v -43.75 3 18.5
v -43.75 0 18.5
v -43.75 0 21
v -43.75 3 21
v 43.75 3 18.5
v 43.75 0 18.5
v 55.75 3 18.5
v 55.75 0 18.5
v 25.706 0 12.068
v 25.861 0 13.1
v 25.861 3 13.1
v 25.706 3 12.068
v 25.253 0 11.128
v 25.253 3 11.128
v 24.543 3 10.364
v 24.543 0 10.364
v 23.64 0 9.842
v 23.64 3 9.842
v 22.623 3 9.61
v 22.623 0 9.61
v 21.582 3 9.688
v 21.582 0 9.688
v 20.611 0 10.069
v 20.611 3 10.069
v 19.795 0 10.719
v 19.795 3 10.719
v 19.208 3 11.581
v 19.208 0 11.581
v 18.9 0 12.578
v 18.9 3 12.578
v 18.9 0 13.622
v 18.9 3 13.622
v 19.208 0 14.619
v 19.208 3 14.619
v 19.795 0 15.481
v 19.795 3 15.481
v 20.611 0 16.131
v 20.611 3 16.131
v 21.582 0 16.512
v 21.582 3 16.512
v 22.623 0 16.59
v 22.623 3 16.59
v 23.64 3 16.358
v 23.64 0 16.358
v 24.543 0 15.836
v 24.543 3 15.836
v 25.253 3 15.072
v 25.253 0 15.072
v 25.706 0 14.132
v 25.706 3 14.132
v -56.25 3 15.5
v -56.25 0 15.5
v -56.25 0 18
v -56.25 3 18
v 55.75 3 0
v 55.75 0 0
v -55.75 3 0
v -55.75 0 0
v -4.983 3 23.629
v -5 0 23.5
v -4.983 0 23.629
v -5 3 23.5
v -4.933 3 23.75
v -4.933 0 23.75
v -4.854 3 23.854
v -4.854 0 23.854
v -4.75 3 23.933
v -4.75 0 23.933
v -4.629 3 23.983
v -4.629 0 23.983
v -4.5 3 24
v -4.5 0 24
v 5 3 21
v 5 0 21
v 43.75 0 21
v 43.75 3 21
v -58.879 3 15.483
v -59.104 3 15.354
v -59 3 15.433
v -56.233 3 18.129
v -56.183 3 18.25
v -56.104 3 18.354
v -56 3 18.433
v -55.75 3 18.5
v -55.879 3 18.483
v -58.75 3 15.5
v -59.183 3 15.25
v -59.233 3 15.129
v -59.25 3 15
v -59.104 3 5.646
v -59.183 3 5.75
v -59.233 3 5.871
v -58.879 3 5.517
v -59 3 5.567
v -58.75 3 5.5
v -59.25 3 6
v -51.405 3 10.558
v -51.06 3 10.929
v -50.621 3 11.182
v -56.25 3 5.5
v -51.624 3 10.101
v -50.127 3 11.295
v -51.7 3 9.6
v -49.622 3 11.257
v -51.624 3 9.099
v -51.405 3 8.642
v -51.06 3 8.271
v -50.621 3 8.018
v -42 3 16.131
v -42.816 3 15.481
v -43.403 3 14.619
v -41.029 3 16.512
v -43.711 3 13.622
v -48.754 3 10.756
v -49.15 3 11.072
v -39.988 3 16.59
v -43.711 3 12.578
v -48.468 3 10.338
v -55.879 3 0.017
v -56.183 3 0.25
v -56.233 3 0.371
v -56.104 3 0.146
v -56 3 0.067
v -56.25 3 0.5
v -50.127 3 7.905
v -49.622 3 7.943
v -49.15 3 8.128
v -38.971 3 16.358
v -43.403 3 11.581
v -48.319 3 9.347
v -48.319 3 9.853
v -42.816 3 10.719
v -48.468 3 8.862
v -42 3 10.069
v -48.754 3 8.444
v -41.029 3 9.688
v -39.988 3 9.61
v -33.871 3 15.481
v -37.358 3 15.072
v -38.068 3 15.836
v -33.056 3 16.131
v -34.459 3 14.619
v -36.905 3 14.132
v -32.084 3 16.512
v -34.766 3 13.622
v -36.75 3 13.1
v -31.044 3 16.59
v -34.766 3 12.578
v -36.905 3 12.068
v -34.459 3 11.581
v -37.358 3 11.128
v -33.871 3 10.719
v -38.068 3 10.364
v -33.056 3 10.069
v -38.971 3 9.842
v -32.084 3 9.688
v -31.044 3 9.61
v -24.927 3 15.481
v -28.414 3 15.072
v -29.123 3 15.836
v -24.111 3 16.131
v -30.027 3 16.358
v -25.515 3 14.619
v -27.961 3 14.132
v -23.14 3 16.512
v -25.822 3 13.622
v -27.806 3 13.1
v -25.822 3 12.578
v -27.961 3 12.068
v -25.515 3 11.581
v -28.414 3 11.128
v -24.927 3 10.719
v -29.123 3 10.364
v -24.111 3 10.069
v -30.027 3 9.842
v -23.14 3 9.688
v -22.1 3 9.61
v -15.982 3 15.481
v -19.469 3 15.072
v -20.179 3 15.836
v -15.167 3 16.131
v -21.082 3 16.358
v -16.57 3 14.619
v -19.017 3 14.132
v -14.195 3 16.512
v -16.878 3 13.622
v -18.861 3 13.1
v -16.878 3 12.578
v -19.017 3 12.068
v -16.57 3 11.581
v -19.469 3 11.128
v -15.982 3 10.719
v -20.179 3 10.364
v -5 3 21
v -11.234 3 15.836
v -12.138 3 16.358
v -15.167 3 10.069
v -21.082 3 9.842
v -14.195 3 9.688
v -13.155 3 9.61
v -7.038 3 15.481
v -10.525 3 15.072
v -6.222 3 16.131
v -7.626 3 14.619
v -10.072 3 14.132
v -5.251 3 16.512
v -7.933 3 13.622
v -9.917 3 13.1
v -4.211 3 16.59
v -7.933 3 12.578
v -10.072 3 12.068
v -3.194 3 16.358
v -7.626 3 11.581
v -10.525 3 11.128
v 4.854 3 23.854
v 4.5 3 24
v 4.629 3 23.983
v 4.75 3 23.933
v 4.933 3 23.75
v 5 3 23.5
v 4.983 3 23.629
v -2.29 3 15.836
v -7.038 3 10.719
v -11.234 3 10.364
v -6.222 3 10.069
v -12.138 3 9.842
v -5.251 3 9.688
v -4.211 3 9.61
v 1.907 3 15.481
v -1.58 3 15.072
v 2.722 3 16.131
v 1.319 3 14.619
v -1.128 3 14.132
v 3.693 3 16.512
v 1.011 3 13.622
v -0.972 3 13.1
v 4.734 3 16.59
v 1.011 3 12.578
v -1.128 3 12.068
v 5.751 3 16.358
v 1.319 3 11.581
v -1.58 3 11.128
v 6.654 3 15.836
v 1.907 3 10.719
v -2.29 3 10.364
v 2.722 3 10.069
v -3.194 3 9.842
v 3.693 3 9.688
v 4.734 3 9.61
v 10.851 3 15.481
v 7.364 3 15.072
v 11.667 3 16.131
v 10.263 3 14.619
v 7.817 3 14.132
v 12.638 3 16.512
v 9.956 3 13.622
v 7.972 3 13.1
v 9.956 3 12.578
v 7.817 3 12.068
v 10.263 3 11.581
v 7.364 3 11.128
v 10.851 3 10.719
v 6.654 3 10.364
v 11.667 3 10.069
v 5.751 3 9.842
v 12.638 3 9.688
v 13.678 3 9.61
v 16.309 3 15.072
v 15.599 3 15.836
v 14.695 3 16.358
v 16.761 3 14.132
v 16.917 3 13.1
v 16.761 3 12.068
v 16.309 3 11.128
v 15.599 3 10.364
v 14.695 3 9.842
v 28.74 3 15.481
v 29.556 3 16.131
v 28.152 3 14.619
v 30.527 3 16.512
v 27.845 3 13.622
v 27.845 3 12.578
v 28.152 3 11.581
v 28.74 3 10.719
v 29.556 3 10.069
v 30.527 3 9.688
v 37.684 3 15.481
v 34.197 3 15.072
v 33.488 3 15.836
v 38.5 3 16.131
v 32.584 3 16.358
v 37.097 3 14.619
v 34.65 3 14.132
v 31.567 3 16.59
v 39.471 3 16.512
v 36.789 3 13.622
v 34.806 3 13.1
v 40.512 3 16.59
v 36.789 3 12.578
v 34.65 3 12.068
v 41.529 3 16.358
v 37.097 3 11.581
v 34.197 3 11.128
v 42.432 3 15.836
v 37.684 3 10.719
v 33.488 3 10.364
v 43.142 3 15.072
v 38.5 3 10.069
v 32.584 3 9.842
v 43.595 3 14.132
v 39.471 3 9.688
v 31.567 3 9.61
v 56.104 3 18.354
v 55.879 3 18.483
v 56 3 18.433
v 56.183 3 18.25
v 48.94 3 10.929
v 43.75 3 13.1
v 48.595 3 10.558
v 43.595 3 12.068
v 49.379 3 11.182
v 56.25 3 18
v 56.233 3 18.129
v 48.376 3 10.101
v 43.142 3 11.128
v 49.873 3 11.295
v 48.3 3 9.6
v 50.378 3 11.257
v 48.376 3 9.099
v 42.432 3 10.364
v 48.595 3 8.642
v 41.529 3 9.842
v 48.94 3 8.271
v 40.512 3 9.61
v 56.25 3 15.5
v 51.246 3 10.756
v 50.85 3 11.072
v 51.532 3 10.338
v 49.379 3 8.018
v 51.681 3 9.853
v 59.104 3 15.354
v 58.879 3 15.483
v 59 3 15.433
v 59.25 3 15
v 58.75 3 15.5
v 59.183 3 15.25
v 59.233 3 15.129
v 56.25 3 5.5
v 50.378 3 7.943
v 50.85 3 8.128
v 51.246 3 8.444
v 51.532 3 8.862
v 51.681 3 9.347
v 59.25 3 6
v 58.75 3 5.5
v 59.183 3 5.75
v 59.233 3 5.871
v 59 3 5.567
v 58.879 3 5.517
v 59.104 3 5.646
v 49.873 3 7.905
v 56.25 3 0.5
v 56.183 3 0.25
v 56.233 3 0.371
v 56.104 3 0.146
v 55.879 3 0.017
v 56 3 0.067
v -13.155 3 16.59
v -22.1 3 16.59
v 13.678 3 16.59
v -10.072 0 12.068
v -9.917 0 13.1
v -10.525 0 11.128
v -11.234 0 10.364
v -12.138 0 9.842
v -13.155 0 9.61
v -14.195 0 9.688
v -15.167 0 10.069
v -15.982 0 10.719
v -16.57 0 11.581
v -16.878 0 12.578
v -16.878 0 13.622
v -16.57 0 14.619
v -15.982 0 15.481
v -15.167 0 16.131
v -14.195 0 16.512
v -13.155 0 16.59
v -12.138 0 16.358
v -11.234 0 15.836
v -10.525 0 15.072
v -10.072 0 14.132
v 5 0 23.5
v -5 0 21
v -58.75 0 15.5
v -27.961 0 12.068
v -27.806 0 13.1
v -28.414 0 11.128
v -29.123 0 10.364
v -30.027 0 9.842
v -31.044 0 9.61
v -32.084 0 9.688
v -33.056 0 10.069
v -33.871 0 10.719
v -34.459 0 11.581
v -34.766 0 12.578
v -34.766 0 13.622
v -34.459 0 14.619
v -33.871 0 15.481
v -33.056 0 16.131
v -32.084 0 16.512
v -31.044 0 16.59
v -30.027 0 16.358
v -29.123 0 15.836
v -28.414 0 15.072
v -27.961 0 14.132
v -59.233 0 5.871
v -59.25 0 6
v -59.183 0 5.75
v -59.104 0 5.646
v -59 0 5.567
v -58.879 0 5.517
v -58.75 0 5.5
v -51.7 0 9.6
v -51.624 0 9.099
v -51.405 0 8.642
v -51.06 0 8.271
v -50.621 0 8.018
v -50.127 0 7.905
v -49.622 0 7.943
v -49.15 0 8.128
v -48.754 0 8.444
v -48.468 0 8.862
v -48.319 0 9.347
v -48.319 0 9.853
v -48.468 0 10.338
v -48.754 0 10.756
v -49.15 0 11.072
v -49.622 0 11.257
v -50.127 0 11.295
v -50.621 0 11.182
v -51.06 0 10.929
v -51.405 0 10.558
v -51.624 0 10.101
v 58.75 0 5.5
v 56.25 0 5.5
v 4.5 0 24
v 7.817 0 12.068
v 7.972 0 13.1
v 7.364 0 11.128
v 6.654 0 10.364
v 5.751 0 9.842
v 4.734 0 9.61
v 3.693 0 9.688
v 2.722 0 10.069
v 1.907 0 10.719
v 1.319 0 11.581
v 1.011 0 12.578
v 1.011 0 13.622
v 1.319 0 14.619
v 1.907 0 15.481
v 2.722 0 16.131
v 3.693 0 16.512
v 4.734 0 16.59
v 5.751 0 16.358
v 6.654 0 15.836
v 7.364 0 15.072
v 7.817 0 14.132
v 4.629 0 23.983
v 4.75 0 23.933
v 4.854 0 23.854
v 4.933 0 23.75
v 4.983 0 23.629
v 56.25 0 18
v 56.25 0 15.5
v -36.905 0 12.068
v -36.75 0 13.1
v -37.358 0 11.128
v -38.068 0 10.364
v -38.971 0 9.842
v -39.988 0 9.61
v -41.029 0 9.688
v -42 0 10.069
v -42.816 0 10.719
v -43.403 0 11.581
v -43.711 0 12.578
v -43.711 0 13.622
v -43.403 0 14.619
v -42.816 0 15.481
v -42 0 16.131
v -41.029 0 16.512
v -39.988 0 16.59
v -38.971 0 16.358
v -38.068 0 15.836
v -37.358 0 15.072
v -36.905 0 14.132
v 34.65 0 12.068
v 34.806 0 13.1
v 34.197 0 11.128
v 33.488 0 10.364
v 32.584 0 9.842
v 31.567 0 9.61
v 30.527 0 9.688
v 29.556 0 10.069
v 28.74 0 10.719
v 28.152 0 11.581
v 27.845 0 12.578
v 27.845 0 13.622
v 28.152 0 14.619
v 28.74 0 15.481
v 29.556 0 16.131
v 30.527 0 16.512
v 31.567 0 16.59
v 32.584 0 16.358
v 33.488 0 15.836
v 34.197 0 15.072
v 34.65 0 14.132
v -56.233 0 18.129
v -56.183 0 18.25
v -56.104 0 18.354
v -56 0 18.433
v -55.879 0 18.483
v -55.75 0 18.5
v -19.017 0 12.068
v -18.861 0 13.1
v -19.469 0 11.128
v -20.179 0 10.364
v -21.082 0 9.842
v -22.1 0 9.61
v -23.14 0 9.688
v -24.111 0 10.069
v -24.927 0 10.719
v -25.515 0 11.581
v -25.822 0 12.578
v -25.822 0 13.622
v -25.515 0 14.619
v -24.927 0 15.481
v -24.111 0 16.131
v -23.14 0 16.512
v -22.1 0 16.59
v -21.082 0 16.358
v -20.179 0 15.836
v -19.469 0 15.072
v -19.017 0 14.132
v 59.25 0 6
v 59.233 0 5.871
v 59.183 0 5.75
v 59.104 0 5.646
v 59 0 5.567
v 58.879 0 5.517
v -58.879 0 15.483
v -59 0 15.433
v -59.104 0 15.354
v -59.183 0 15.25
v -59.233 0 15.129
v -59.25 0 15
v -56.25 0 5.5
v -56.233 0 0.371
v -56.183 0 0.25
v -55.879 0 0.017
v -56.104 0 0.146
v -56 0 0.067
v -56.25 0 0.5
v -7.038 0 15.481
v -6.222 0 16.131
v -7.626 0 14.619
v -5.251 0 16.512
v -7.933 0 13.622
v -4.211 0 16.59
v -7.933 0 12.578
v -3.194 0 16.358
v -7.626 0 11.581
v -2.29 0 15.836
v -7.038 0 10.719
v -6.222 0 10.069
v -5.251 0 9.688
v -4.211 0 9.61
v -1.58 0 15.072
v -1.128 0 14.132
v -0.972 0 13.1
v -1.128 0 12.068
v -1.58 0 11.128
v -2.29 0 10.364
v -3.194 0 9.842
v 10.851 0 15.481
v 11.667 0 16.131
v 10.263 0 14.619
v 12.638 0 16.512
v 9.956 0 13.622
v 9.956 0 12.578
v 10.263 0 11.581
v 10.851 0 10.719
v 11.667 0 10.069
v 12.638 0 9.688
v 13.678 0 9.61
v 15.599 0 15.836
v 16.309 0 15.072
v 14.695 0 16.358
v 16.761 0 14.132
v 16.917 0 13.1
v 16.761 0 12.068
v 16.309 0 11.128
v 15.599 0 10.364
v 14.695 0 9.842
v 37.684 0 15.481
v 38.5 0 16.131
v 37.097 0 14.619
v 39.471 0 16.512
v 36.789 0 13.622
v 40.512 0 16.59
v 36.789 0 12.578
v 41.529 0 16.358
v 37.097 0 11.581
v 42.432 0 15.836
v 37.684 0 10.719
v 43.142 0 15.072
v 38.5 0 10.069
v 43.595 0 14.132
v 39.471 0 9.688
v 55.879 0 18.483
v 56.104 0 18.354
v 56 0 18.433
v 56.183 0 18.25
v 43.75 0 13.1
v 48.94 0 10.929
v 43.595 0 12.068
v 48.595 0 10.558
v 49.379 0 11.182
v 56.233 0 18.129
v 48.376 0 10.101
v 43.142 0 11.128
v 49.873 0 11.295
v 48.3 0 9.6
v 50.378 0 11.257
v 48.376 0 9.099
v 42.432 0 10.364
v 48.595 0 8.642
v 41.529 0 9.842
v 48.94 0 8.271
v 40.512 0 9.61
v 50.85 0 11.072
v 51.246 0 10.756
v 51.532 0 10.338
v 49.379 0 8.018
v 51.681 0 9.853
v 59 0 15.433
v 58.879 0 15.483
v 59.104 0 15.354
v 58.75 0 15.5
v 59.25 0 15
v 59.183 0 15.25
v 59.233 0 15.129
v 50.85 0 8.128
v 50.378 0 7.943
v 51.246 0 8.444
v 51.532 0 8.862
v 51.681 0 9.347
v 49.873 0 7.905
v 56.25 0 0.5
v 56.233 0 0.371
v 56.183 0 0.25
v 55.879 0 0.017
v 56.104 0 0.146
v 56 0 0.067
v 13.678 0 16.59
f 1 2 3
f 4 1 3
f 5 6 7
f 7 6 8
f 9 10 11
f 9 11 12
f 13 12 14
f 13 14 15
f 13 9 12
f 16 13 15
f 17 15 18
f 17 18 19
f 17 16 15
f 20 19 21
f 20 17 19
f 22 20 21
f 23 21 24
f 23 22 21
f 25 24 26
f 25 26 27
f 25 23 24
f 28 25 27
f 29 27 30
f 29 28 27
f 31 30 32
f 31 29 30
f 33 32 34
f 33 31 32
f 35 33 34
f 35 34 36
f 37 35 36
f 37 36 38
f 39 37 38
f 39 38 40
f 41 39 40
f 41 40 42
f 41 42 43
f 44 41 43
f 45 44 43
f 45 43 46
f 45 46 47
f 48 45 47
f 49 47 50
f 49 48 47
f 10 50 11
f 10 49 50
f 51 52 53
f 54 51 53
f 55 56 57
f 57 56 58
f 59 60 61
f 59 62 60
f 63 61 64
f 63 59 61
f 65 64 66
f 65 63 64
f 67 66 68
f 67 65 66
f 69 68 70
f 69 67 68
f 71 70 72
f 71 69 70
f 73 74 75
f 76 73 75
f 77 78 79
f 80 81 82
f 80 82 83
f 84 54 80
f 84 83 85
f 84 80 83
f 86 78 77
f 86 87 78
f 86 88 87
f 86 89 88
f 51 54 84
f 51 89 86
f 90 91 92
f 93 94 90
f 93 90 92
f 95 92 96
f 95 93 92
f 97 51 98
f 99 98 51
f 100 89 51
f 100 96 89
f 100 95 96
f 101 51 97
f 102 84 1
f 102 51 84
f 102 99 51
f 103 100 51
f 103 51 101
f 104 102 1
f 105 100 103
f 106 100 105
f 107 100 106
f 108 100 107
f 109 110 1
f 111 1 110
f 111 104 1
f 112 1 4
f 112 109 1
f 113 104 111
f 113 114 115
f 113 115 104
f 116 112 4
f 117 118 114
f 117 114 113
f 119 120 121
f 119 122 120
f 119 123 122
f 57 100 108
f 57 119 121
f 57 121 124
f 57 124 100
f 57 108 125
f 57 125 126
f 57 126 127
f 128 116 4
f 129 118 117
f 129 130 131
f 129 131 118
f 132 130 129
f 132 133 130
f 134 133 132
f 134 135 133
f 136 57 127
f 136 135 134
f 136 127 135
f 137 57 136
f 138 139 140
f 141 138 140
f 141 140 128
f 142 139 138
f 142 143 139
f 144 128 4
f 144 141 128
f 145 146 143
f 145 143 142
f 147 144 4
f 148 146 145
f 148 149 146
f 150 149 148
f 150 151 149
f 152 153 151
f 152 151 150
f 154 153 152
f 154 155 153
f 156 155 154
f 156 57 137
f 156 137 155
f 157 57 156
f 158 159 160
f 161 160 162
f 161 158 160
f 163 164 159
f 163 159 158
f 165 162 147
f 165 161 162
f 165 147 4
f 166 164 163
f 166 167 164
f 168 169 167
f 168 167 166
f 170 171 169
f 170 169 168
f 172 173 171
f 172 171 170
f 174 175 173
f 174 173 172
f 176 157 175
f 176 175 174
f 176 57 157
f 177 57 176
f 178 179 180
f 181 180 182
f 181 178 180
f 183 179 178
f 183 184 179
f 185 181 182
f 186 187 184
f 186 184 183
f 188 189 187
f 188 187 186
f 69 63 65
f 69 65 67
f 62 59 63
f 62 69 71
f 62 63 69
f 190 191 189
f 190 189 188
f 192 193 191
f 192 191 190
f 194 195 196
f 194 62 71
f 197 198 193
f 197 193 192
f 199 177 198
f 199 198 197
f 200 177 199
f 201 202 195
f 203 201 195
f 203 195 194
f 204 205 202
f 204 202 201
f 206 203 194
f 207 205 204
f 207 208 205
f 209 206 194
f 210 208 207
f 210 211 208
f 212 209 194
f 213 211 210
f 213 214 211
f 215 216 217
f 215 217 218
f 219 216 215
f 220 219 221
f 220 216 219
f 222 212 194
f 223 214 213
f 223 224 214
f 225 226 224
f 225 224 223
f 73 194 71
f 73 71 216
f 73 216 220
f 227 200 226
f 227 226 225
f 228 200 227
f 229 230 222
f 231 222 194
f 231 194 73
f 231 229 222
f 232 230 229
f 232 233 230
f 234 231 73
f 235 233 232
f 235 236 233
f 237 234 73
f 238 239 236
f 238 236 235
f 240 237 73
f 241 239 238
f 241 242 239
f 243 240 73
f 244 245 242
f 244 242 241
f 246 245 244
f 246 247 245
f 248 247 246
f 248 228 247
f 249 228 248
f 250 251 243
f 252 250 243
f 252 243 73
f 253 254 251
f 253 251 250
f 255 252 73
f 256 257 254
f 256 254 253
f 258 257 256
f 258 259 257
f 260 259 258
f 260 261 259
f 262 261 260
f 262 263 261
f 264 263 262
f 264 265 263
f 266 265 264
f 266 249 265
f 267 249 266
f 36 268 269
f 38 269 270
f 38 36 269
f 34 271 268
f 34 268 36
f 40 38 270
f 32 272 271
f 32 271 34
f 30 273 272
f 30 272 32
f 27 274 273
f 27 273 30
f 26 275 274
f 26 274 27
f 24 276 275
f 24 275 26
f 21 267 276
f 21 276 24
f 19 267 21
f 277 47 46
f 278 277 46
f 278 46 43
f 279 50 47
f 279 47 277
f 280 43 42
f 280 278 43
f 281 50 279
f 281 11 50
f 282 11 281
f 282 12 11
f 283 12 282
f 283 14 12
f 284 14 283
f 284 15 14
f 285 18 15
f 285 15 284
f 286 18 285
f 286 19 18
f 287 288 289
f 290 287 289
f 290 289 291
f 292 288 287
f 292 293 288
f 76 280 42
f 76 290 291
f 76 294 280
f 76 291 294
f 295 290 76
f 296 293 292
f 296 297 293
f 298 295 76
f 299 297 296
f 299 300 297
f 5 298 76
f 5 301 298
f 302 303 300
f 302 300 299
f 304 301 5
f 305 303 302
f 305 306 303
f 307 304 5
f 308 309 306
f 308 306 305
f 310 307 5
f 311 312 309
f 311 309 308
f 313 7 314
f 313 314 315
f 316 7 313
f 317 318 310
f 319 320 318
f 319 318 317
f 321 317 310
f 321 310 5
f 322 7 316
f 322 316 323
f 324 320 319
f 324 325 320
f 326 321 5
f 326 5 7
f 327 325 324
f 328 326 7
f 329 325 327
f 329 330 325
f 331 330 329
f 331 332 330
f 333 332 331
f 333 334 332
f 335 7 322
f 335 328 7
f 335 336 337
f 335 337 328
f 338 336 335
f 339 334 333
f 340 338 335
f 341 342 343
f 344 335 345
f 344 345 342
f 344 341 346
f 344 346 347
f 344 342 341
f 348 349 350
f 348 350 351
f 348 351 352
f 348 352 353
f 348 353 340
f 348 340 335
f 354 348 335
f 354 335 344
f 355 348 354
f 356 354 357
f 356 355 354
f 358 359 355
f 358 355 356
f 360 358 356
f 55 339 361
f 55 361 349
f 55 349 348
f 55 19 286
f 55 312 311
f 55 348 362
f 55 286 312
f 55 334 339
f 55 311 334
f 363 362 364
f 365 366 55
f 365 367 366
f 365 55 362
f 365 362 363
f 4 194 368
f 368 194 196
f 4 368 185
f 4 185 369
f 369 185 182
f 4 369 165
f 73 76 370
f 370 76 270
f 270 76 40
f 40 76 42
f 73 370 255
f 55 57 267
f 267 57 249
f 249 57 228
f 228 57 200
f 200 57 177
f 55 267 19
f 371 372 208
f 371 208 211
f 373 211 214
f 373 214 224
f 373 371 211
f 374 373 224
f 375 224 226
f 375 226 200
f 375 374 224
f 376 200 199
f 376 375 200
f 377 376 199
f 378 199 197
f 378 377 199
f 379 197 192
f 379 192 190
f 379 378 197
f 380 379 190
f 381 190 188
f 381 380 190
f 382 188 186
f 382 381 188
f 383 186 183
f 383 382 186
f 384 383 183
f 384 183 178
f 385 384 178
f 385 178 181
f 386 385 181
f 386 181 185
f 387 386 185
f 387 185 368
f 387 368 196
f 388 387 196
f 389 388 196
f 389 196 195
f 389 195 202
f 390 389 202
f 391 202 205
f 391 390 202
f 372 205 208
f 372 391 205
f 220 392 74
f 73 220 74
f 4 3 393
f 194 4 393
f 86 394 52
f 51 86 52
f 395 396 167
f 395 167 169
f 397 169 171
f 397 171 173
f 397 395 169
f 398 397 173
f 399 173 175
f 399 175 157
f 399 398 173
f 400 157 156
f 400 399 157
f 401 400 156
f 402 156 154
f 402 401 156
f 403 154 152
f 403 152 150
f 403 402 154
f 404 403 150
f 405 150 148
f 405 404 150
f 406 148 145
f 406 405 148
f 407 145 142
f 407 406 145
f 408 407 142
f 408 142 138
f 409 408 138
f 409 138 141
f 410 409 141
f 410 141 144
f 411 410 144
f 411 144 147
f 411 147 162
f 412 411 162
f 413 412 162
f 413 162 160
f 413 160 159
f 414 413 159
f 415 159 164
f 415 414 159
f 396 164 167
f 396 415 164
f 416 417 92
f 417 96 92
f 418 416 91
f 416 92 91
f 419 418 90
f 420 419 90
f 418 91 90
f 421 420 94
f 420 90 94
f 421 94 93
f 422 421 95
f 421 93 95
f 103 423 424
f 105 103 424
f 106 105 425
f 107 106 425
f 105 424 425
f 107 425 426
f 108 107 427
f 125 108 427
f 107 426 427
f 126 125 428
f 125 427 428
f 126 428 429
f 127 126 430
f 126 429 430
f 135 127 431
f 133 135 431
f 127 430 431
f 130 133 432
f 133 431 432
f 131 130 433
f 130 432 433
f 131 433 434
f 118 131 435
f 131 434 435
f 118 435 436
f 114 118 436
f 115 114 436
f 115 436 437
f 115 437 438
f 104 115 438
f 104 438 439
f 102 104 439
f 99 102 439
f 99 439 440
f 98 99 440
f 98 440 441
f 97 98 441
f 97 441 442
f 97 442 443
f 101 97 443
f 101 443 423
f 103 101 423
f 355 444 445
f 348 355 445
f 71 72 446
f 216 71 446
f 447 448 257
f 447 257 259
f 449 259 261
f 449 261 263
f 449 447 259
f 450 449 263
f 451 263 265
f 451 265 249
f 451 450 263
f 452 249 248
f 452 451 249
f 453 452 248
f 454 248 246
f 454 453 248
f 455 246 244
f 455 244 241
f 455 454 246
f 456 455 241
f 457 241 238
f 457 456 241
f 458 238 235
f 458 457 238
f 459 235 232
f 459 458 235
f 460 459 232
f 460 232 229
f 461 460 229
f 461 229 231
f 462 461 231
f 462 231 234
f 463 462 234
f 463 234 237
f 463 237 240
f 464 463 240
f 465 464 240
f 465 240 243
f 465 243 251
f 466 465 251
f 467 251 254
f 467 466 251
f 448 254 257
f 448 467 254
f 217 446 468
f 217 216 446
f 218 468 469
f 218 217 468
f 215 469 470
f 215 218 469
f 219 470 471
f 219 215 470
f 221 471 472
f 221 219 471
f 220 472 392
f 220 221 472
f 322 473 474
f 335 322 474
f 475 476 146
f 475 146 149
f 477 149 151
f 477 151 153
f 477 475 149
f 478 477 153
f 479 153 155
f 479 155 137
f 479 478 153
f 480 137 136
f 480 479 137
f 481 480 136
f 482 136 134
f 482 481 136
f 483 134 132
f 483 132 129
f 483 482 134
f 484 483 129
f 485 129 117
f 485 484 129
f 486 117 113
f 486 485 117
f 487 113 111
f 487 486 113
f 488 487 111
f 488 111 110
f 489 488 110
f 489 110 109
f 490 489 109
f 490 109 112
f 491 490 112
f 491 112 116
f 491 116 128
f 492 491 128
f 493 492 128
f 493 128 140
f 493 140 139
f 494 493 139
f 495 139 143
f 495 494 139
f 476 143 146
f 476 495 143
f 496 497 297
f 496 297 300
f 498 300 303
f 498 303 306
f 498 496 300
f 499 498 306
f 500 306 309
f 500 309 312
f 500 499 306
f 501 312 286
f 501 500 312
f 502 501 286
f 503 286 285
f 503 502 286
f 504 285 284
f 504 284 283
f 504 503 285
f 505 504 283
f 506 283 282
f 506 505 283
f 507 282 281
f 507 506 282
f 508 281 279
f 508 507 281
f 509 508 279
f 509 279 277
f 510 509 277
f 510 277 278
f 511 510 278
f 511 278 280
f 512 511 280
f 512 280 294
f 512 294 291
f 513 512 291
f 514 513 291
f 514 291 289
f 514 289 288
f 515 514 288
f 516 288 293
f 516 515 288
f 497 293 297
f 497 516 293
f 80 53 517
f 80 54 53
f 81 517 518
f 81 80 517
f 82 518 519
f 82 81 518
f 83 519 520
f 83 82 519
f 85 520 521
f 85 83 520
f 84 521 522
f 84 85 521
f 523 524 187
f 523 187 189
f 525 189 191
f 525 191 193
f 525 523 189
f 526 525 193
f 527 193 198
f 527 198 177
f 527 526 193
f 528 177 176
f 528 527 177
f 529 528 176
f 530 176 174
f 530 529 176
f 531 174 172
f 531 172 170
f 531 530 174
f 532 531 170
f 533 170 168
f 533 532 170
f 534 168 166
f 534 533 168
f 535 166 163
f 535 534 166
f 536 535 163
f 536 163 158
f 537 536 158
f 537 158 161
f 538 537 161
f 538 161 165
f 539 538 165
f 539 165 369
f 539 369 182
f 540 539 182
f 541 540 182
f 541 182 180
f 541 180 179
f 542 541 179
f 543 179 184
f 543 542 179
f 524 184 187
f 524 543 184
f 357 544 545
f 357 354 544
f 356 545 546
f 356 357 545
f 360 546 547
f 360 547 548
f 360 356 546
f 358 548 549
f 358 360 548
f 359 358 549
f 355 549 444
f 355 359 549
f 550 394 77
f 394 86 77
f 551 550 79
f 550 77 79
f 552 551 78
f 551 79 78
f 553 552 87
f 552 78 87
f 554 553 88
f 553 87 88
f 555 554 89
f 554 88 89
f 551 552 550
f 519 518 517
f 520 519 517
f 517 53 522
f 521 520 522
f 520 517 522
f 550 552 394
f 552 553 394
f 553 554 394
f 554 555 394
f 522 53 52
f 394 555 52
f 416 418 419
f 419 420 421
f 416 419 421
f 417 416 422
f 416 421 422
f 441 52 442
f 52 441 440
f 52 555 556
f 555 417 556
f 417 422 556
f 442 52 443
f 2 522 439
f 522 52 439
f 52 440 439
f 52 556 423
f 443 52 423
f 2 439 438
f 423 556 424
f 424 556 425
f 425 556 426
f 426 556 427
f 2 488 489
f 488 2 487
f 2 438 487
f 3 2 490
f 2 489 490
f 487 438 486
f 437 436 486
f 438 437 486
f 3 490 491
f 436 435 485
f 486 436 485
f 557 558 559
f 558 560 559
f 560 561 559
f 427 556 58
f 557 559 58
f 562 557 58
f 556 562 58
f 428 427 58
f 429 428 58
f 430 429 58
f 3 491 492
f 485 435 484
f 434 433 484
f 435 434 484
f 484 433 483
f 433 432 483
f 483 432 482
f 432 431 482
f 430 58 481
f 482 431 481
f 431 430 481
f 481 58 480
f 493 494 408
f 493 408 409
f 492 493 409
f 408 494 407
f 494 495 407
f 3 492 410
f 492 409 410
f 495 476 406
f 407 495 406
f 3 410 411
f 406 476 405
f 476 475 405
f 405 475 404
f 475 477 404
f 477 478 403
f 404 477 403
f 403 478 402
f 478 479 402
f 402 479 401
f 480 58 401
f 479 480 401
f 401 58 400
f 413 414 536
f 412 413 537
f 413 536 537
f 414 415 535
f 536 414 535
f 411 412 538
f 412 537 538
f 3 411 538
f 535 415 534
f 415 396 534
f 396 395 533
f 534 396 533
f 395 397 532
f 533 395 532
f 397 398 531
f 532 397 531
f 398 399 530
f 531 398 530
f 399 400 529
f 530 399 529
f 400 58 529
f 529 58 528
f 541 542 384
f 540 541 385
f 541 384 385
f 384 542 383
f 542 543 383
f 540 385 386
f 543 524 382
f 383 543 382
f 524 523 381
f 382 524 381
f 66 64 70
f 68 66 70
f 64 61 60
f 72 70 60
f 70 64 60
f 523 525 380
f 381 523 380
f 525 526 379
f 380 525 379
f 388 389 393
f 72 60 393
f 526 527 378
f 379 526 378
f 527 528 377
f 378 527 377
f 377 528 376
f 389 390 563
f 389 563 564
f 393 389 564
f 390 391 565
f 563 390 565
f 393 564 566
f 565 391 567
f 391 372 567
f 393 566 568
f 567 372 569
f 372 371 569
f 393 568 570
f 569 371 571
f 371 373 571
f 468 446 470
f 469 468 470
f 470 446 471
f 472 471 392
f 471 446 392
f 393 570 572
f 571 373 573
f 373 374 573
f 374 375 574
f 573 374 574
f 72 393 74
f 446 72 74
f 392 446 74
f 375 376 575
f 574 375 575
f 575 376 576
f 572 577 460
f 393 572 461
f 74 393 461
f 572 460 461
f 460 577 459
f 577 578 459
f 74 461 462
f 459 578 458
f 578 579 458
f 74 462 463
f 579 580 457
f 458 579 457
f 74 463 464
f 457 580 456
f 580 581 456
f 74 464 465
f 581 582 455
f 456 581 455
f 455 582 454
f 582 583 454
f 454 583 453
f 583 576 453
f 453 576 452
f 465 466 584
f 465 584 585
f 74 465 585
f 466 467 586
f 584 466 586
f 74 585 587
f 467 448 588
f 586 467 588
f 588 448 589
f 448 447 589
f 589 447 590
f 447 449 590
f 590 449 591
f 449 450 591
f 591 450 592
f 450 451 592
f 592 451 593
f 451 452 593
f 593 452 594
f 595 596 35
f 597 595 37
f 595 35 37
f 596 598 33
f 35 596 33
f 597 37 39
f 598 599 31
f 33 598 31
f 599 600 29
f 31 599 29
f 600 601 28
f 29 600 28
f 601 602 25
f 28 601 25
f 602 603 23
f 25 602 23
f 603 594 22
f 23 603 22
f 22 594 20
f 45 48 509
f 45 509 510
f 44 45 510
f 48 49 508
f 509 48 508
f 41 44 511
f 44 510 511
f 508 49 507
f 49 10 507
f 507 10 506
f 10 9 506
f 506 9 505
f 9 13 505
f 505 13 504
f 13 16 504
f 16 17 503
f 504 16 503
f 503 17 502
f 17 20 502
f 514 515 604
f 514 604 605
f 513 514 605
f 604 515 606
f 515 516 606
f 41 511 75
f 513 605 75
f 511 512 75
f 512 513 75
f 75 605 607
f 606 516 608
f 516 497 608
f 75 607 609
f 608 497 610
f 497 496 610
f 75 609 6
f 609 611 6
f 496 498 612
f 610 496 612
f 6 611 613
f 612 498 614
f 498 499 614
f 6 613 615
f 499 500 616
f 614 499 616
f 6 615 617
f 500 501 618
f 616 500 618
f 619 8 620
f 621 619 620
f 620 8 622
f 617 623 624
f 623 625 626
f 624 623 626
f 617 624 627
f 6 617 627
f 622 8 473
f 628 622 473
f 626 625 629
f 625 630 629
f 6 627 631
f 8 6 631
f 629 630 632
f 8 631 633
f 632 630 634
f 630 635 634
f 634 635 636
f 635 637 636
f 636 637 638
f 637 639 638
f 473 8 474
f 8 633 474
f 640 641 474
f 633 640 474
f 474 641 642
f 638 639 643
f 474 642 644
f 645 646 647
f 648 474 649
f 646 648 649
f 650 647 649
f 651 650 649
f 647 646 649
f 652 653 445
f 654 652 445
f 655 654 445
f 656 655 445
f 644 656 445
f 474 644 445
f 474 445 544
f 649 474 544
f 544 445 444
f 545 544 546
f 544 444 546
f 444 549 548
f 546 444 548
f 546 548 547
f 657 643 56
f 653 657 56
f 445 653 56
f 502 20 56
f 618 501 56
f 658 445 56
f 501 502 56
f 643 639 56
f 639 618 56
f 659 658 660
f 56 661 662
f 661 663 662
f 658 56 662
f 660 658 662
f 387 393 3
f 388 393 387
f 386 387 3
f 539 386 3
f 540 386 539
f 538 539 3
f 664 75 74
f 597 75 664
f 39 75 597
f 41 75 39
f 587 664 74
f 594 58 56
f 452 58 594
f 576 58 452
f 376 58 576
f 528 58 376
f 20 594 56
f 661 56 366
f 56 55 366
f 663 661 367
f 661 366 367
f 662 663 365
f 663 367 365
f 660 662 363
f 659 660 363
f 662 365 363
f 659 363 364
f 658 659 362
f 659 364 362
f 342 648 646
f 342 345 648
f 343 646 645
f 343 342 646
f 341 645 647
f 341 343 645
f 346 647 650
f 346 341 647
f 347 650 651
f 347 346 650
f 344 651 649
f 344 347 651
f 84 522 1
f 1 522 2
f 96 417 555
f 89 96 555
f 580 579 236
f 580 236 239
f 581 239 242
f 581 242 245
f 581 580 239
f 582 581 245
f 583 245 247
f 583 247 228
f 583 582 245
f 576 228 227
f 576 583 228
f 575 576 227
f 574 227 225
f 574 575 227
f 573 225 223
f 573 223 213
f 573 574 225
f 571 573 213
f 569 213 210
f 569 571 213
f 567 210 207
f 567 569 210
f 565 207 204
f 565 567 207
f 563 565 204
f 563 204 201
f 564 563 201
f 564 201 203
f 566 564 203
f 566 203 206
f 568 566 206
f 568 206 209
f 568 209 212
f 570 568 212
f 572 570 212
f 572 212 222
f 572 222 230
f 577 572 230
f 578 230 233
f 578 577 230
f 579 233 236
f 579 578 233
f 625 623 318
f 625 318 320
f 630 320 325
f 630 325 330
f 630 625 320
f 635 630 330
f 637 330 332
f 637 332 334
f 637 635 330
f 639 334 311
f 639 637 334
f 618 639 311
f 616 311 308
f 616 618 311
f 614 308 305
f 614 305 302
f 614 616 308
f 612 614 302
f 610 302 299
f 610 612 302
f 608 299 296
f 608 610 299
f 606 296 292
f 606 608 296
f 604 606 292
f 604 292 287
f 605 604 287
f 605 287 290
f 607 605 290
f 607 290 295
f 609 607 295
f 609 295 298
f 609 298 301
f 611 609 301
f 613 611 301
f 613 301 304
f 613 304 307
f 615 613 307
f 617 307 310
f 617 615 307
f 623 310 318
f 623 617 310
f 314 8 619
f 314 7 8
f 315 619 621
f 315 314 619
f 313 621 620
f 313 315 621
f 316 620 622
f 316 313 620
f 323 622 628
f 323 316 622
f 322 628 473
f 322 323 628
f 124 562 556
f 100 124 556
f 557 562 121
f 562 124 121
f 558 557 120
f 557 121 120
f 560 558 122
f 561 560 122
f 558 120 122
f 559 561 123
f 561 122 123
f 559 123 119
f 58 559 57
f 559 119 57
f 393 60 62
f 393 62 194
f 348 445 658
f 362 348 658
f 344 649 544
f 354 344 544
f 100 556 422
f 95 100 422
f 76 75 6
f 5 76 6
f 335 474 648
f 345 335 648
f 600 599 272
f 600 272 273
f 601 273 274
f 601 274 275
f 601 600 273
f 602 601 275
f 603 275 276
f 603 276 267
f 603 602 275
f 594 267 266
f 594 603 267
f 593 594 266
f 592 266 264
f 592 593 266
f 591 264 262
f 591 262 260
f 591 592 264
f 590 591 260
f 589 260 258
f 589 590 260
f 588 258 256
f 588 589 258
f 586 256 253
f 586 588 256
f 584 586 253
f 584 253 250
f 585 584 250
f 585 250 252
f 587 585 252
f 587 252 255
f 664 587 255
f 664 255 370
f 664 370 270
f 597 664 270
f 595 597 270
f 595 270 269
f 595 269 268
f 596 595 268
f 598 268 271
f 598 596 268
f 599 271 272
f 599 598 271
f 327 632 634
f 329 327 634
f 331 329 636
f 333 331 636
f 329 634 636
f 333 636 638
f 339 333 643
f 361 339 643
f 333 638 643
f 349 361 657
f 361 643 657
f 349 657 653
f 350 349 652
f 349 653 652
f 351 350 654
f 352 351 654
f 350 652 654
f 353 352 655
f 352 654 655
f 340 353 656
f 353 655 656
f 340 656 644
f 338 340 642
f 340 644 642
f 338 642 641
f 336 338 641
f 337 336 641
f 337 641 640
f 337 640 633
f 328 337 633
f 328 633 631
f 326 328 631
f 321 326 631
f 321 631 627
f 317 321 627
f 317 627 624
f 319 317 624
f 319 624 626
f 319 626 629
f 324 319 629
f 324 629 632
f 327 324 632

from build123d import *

# Parameters (mm, degrees)
SKETCH_1_R            = 3.5
SKETCH_1_W            = 10
SKETCH_1_H            = 3
EXTRUDE_1_DEPTH       = 3
HOLE_WIZARD_M31_D     = 3.4
HOLE_WIZARD_M31_DEPTH = 10
HOLE_WIZARD_M31_TIP   = 1.021463052
FILLET_1_R            = 0.5
FILLET_2_R            = 0.5


with BuildPart() as part:
    # Эскиз1 → Бобышка-Вытянуть1 (new body)
    with BuildSketch(Plane(origin=(0, 0, 0), x_dir=(1, 0, 0), z_dir=(0, 1, 0))):
        Polygon((-43.75, -21), (43.75, -21), (43.75, -18.5), (56.25, -18.5), (56.25, -15.5), (59.25, -15.5), (59.25, -5.5), (56.25, -5.5), (56.25, 0), (-56.25, 0), (-56.25, -5.5), (-59.25, -5.5), (-59.25, -15.5), (-56.25, -15.5), (-56.25, -18.5), (-43.75, -18.5), align=None)
        with Locations((-40.25, -13.1)):
            Circle(SKETCH_1_R, mode=Mode.SUBTRACT)
        with Locations((-31.305555556, -13.1)):
            Circle(SKETCH_1_R, mode=Mode.SUBTRACT)
        with Locations((-22.361111111, -13.1)):
            Circle(SKETCH_1_R, mode=Mode.SUBTRACT)
        with Locations((-13.416666667, -13.1)):
            Circle(SKETCH_1_R, mode=Mode.SUBTRACT)
        with Locations((-4.472222222, -13.1)):
            Circle(SKETCH_1_R, mode=Mode.SUBTRACT)
        with Locations((4.472222222, -13.1)):
            Circle(SKETCH_1_R, mode=Mode.SUBTRACT)
        with Locations((13.416666667, -13.1)):
            Circle(SKETCH_1_R, mode=Mode.SUBTRACT)
        with Locations((22.361111111, -13.1)):
            Circle(SKETCH_1_R, mode=Mode.SUBTRACT)
        with Locations((31.305555556, -13.1)):
            Circle(SKETCH_1_R, mode=Mode.SUBTRACT)
        with Locations((40.25, -13.1)):
            Circle(SKETCH_1_R, mode=Mode.SUBTRACT)
        with Locations((0, -22.5)):
            Rectangle(SKETCH_1_W, SKETCH_1_H)
    extrude(amount=EXTRUDE_1_DEPTH)

    # Отверстие с зазором M31
    with Locations(Plane(origin=(0, 3, 0), x_dir=(1, 0, 0), z_dir=(0, 1, 0))):
        with Locations((50, -9.6), (-50, -9.6)):
            Hole(HOLE_WIZARD_M31_D / 2, depth=HOLE_WIZARD_M31_DEPTH)
            with Locations((0, 0, -(HOLE_WIZARD_M31_DEPTH + HOLE_WIZARD_M31_TIP / 2))):  # 118° drill point
                Cone(0, HOLE_WIZARD_M31_D / 2, HOLE_WIZARD_M31_TIP, mode=Mode.SUBTRACT)

    # Скругление1
    fillet_1_edges = [part.edges().sort_by_distance(p)[0] for p in [
        (-59.25, 1.5, 15.5),
        (-59.25, 1.5, 5.5),
        (59.25, 1.5, 5.5),
        (59.25, 1.5, 15.5),
    ]]
    fillet(fillet_1_edges, radius=FILLET_1_R)

    # Скругление2
    fillet_2_edges = [part.edges().sort_by_distance(p)[0] for p in [
        (-56.25, 1.5, 18.5),
        (-56.25, 1.5, 0),
        (56.25, 1.5, 0),
        (56.25, 1.5, 18.5),
        (5, 1.5, 24),
        (-5, 1.5, 24),
    ]]
    fillet(fillet_2_edges, radius=FILLET_2_R)


solid = part.part
